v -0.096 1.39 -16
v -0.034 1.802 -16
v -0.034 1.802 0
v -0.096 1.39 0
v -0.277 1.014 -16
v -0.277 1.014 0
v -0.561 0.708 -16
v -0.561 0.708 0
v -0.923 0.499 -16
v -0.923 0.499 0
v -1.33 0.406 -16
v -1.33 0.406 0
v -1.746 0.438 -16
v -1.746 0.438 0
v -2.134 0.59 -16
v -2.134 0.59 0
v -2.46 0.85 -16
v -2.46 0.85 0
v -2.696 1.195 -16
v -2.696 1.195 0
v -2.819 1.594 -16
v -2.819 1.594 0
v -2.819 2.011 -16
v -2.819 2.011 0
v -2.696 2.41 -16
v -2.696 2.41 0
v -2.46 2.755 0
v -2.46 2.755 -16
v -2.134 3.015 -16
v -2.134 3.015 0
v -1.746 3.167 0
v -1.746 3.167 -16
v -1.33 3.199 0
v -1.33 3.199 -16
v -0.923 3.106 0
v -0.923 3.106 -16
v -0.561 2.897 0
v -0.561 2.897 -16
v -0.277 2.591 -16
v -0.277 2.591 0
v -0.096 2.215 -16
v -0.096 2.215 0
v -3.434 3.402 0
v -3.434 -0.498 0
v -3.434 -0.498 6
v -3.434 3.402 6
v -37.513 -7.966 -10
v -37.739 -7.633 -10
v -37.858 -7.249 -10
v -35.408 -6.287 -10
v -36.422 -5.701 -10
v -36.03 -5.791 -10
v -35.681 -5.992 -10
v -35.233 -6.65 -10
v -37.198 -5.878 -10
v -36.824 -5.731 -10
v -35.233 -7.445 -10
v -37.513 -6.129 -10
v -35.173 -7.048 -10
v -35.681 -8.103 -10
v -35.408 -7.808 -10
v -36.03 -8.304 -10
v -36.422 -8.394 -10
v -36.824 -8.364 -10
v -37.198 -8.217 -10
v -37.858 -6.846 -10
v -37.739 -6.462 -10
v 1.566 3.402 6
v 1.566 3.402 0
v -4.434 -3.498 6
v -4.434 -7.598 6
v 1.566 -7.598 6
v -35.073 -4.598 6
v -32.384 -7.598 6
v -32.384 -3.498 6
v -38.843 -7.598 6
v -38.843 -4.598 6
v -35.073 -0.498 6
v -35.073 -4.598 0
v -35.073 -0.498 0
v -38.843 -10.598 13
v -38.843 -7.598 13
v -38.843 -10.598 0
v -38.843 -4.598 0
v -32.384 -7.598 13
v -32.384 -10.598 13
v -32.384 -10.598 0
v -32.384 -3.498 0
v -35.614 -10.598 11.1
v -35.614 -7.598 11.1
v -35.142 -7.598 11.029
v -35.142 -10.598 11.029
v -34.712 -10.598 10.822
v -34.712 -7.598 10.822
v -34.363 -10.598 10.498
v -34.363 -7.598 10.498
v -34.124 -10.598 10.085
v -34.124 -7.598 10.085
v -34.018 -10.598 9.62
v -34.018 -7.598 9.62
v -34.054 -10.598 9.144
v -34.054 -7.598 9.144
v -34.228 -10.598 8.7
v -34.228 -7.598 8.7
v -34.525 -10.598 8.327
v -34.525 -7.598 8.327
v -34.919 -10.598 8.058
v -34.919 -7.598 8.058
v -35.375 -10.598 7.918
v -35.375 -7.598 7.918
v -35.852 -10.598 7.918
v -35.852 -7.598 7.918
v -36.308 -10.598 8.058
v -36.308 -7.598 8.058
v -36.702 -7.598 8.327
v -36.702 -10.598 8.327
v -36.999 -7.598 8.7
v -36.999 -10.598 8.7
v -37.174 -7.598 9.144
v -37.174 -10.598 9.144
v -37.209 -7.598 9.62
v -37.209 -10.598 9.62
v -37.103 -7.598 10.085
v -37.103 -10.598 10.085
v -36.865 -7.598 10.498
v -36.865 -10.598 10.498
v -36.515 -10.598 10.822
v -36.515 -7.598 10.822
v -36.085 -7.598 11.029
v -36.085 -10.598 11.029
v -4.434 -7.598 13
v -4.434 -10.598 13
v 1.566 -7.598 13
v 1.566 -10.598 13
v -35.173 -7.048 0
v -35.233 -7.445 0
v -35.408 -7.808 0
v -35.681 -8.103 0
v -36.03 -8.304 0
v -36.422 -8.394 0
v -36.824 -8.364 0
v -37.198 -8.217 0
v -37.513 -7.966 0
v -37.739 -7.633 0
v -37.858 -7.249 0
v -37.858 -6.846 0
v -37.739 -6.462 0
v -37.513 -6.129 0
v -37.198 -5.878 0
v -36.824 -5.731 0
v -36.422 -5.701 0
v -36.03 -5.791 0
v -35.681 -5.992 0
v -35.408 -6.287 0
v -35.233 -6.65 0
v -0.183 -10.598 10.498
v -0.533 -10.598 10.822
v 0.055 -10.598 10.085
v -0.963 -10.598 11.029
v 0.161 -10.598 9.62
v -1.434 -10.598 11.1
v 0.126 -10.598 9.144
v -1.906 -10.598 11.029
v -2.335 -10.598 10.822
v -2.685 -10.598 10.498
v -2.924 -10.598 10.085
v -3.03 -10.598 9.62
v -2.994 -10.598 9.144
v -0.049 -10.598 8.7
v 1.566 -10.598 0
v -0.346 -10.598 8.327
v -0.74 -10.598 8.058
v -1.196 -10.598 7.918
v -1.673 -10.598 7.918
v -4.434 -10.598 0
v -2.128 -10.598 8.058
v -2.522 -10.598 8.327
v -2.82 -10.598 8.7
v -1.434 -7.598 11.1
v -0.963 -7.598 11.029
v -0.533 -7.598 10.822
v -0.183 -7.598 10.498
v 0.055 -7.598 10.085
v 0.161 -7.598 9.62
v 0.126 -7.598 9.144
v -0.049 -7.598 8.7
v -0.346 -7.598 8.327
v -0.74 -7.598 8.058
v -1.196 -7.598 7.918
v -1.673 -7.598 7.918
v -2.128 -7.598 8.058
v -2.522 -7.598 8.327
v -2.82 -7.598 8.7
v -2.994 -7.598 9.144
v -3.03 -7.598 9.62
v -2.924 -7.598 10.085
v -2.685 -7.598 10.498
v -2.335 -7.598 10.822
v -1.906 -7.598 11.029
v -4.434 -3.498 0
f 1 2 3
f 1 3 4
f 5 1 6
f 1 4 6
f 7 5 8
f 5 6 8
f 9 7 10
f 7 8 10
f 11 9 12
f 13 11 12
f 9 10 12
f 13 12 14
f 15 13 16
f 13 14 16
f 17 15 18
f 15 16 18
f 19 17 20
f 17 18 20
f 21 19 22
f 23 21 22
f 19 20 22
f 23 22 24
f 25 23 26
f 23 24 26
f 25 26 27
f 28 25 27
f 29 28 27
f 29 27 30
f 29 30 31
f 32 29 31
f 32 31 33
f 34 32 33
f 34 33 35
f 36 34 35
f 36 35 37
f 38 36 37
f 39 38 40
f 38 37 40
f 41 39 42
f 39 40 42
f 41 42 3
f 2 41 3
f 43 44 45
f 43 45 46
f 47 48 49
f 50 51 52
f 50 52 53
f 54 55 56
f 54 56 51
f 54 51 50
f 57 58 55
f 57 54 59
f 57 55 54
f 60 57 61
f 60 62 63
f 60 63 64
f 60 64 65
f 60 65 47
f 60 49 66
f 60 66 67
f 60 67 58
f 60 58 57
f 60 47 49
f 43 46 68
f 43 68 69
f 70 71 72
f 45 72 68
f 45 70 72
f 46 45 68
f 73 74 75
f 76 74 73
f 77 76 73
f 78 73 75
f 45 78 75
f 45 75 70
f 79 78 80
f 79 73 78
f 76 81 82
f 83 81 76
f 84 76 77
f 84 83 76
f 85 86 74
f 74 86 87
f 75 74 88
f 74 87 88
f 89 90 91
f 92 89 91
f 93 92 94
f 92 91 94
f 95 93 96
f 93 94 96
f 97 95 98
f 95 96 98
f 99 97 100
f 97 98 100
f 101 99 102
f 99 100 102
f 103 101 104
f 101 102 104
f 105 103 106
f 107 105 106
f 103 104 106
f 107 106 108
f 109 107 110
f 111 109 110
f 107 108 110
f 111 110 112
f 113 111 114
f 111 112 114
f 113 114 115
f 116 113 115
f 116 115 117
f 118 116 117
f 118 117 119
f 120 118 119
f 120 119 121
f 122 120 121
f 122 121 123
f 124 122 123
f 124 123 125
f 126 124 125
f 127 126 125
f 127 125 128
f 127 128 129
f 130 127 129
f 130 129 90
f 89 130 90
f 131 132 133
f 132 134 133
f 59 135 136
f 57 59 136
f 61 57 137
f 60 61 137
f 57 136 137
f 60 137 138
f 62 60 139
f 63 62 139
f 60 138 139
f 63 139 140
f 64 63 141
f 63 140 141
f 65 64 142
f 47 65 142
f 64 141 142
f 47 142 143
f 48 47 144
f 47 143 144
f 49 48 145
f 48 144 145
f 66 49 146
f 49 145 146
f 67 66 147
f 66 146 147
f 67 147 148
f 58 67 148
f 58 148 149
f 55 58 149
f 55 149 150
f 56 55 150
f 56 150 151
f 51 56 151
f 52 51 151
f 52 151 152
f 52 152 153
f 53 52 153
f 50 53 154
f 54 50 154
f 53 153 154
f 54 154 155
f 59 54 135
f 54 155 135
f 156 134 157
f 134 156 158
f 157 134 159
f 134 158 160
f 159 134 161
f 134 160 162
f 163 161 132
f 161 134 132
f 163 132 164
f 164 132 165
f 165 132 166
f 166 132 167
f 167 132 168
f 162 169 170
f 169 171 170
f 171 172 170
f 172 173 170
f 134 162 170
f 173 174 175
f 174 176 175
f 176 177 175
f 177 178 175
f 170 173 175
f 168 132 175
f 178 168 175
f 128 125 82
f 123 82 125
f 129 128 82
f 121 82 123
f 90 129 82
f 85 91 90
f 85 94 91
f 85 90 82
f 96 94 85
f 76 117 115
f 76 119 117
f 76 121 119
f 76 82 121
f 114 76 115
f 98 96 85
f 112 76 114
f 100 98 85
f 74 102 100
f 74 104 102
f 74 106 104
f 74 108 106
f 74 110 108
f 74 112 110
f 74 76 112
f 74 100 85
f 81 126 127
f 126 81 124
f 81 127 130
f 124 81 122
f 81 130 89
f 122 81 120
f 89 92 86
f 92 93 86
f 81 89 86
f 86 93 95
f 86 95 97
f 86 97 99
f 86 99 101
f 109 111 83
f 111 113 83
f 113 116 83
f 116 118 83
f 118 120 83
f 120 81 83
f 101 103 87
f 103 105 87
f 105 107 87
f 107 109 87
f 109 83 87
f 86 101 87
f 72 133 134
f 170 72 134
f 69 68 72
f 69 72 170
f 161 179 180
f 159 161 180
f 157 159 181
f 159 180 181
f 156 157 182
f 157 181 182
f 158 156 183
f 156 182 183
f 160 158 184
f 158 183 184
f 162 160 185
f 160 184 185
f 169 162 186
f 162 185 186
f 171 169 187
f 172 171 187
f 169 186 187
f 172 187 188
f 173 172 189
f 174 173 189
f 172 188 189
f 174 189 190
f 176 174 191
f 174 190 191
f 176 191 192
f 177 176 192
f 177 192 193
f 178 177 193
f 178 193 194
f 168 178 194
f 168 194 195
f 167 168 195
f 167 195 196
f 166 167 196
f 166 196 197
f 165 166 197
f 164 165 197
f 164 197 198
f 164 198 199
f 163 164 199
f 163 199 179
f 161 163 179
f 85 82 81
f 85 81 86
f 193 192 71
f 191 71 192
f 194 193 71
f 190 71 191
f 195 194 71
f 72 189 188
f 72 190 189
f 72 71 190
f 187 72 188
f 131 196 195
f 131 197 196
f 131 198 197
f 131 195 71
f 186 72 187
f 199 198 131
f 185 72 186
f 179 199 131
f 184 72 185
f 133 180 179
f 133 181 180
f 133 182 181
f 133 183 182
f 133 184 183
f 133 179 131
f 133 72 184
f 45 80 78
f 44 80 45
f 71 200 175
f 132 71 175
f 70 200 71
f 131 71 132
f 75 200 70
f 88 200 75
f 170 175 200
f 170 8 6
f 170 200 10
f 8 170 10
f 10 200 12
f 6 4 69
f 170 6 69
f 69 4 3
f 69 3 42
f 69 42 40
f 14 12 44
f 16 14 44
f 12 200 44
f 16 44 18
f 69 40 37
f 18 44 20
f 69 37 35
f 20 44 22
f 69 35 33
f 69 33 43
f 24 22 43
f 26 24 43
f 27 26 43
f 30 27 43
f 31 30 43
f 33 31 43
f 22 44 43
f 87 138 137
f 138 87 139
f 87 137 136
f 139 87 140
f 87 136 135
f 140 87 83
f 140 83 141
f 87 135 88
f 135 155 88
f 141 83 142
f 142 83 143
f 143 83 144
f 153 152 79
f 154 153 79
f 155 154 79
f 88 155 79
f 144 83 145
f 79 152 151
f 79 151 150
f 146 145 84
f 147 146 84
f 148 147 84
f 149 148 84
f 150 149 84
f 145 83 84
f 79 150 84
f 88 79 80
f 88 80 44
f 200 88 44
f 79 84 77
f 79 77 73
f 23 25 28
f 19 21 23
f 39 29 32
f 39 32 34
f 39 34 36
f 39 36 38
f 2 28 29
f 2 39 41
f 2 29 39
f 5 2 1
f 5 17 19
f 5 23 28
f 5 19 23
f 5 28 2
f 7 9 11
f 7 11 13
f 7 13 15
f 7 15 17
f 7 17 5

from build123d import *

# Parameters (mm, degrees)
SKETCH1_W            = 4
SKETCH1_H            = 14
BOSS_EXTRUDE1_DEPTH  = 3
SKETCH2_R            = 1.4
BOSS_EXTRUDE2_DEPTH  = 16
SKETCH3_W            = 4
SKETCH3_H            = 1
BOSS_EXTRUDE4_DEPTH  = 6
SKETCH7_W            = 3
SKETCH7_H            = 2
BOSS_EXTRUDE5_DEPTH  = 30.95
SKETCH8_W            = 3
SKETCH8_H            = 2
BOSS_EXTRUDE6_DEPTH  = 1
SKETCH9_W            = 1
SKETCH9_H            = 2
BOSS_EXTRUDE7_DEPTH  = 3
SKETCH10_W           = 1
SKETCH10_H           = 2
BOSS_EXTRUDE8_DEPTH  = 5.92
SKETCH11_W           = 1
SKETCH11_H           = 2
BOSS_EXTRUDE9_DEPTH  = 4
SKETCH12_W           = 1
SKETCH12_H           = 3
BOSS_EXTRUDE14_DEPTH = 0.93
SKETCH13_W           = 3
SKETCH13_H           = 3
BOSS_EXTRUDE15_DEPTH = 7.1
SKETCH14_W           = 3.33402541
SKETCH14_H           = 13.860919233
CUT_EXTRUDE3_DEPTH   = 10
SKETCH15_W           = 6.20666024
SKETCH15_H           = 3.660501205
CUT_EXTRUDE4_DEPTH   = 10
SKETCH16_W           = 3
SKETCH16_H           = 9.1
BOSS_EXTRUDE16_DEPTH = 0.12
SKETCH18_W           = 3
SKETCH18_H           = 9.1
BOSS_EXTRUDE18_DEPTH = 0.41
SKETCH19_W           = 3
SKETCH19_H           = 9.1
BOSS_EXTRUDE19_DEPTH = 0.89
SKETCH20_W           = 3
SKETCH20_H           = 6
BOSS_EXTRUDE20_DEPTH = 3.77
SKETCH21_R           = 1.35
BOSS_EXTRUDE23_DEPTH = 10
BOSS_EXTRUDE24_DEPTH = 3
SKETCH24_W           = 4
SKETCH24_H           = 1
BOSS_EXTRUDE25_DEPTH = 4
SKETCH25_W           = 4
SKETCH25_H           = 7
BOSS_EXTRUDE26_DEPTH = 2
SKETCH26_W           = 6.458993184
SKETCH26_H           = 3
BOSS_EXTRUDE27_DEPTH = 7
SKETCH27_R           = 1.6
CUT_EXTRUDE5_DEPTH   = 7
SKETCH28_R           = 1.6
CUT_EXTRUDE6_DEPTH   = 7
SKETCH30_W           = 7
SKETCH30_H           = 3
BOSS_EXTRUDE29_DEPTH = 1
SKETCH31_W           = 7
SKETCH31_H           = 3
BOSS_EXTRUDE30_DEPTH = 1
SKETCH32_W           = 6
SKETCH32_H           = 7.1
BOSS_EXTRUDE31_DEPTH = 1
SKETCH33_W           = 31.638993184
SKETCH33_H           = 6
BOSS_EXTRUDE32_DEPTH = 1
SKETCH34_W           = 6
SKETCH34_H           = 14
BOSS_EXTRUDE33_DEPTH = 1


with BuildPart() as part:
    # Sketch1 → Boss-Extrude1 (new body)
    with BuildSketch(Plane.XY):
        with Locations((-1.434146341, -3.597560976)):
            Rectangle(SKETCH1_W, SKETCH1_H)
    extrude(amount=BOSS_EXTRUDE1_DEPTH)

    # Sketch2 → Boss-Extrude2 (add)
    with BuildSketch(Plane(origin=(0, 0, 0), x_dir=(-1, 0, 0), z_dir=(0, 0, -1))):
        with Locations((1.434146341, 1.802439024)):
            Circle(SKETCH2_R)
    extrude(amount=BOSS_EXTRUDE2_DEPTH)

    # Sketch3 → Boss-Extrude4 (add)
    with BuildSketch(Plane.XY.offset(3)):
        with Locations((-1.434146341, -10.097560976)):
            Rectangle(SKETCH3_W, SKETCH3_H)
    extrude(amount=BOSS_EXTRUDE4_DEPTH)

    # Sketch7 → Boss-Extrude5 (add)
    with BuildSketch(Plane.ZY.offset(3.434146341)):
        with Locations((1.5, -2.497560976)):
            Rectangle(SKETCH7_W, SKETCH7_H)
    extrude(amount=BOSS_EXTRUDE5_DEPTH)

    # Sketch8 → Boss-Extrude6 (add)
    with BuildSketch(Plane.ZY.offset(34.384146341)):
        with Locations((1.5, -2.497560976)):
            Rectangle(SKETCH8_W, SKETCH8_H)
    extrude(amount=BOSS_EXTRUDE6_DEPTH)

    # Sketch9 → Boss-Extrude7 (add)
    with BuildSketch(Plane(origin=(0, 0, 0), x_dir=(-1, 0, 0), z_dir=(0, 0, -1))):
        with Locations((34.884146341, -2.497560976)):
            Rectangle(SKETCH9_W, SKETCH9_H)
    extrude(amount=BOSS_EXTRUDE7_DEPTH)

    # Sketch10 → Boss-Extrude8 (add)
    with BuildSketch(Plane(origin=(0, 0, -3), x_dir=(-1, 0, 0), z_dir=(0, 0, -1))):
        with Locations((34.884146341, -2.497560976)):
            Rectangle(SKETCH10_W, SKETCH10_H)
    extrude(amount=BOSS_EXTRUDE8_DEPTH)

    # Sketch11 → Boss-Extrude9 (add)
    with BuildSketch(Plane(origin=(0, 0, -8.92), x_dir=(-1, 0, 0), z_dir=(0, 0, -1))):
        with Locations((34.884146341, -2.497560976)):
            Rectangle(SKETCH11_W, SKETCH11_H)
    extrude(amount=BOSS_EXTRUDE9_DEPTH)

    # Sketch12 → Boss-Extrude14 (add)
    with BuildSketch(Plane.XZ.offset(3.497560976)):
        with Locations((-34.884146341, -9.28)):
            Rectangle(SKETCH12_W, SKETCH12_H)
    extrude(amount=BOSS_EXTRUDE14_DEPTH)

    # Sketch13 → Boss-Extrude15 (add)
    with BuildSketch(Plane.XZ.offset(3.497560976)):
        with Locations((-33.884146341, 1.5)):
            Rectangle(SKETCH13_W, SKETCH13_H)
    extrude(amount=BOSS_EXTRUDE15_DEPTH)

    # Sketch14 → Cut-Extrude3 (cut)
    with BuildSketch(Plane.XY.offset(3)):
        with Locations((-35.32015223, -3.66710136)):
            Rectangle(SKETCH14_W, SKETCH14_H)
    extrude(amount=-CUT_EXTRUDE3_DEPTH, mode=Mode.SUBTRACT)


with BuildPart() as cut_extrude3_piece_1:
    # of the separate pieces the step leaves, piece 1, a body of its own (cut_extrude3_pieces)
    add(part.part.solids().sort_by_distance((-3.434146341, 3.402439024, 0))[0])

    # Sketch16 → Boss-Extrude16 (add)
    with BuildSketch(Plane.ZY.offset(33.653139525)):
        with Locations((1.5, -6.047560976)):
            Rectangle(SKETCH16_W, SKETCH16_H)
    extrude(amount=BOSS_EXTRUDE16_DEPTH)

    # Sketch18 → Boss-Extrude18 (add)
    with BuildSketch(Plane.ZY.offset(33.773139525)):
        with Locations((1.5, -6.047560976)):
            Rectangle(SKETCH18_W, SKETCH18_H)
    extrude(amount=BOSS_EXTRUDE18_DEPTH)

    # Sketch19 → Boss-Extrude19 (add)
    with BuildSketch(Plane.ZY.offset(34.183139525)):
        with Locations((1.5, -6.047560976)):
            Rectangle(SKETCH19_W, SKETCH19_H)
    extrude(amount=BOSS_EXTRUDE19_DEPTH)

    # Sketch20 → Boss-Extrude20 (add)
    with BuildSketch(Plane.ZY.offset(35.073139525)):
        with Locations((1.5, -7.597560976)):
            Rectangle(SKETCH20_W, SKETCH20_H)
    extrude(amount=BOSS_EXTRUDE20_DEPTH)

    # Sketch21 → Boss-Extrude23 (add)
    with BuildSketch(Plane(origin=(0, 0, 0), x_dir=(-1, 0, 0), z_dir=(0, 0, -1))):
        with Locations((36.523139525, -7.047560976)):
            Circle(SKETCH21_R)
    extrude(amount=BOSS_EXTRUDE23_DEPTH)

    # Sketch23 → Boss-Extrude24 (add)
    with BuildSketch(Plane.XY.offset(3)):
        Polygon((-38.843139525, -10.597560976), (-38.843139525, -4.597560976), (-35.073139525, -4.597560976), (-35.073139525, -1.497560976), (-3.434146341, -1.497560976), (-3.434146341, 3.402439024), (0.565853659, 3.402439024), (0.565853659, -9.597560976), (-3.434146341, -9.597560976), (-3.434146341, -3.497560976), (-32.384146341, -3.497560976), (-32.384146341, -10.597560976), align=None)
    extrude(amount=BOSS_EXTRUDE24_DEPTH)

    # Sketch24 → Boss-Extrude25 (add)
    with BuildSketch(Plane.XY.offset(9)):
        with Locations((-1.434146341, -10.097560976)):
            Rectangle(SKETCH24_W, SKETCH24_H)
    extrude(amount=BOSS_EXTRUDE25_DEPTH)

    # Sketch25 → Boss-Extrude26 (add)
    with BuildSketch(Plane(origin=(0, -9.597560976, 0), x_dir=(1, 0, 0), z_dir=(0, 1, 0))):
        with Locations((-1.434146341, -9.5)):
            Rectangle(SKETCH25_W, SKETCH25_H)
    extrude(amount=BOSS_EXTRUDE26_DEPTH)

    # Sketch26 → Boss-Extrude27 (add)
    with BuildSketch(Plane.XY.offset(6)):
        with Locations((-35.613642933, -9.097560976)):
            Rectangle(SKETCH26_W, SKETCH26_H)
    extrude(amount=BOSS_EXTRUDE27_DEPTH)

    # Sketch27 → Cut-Extrude5 (cut)
    with BuildSketch(Plane(origin=(0, -7.597560976, 0), x_dir=(1, 0, 0), z_dir=(0, 1, 0))):
        with Locations((-35.613642933, -9.5)):
            Circle(SKETCH27_R)
    extrude(amount=-CUT_EXTRUDE5_DEPTH, mode=Mode.SUBTRACT)

    # Sketch28 → Cut-Extrude6 (cut)
    with BuildSketch(Plane(origin=(0, -7.597560976, 0), x_dir=(1, 0, 0), z_dir=(0, 1, 0))):
        with Locations((-1.434146341, -9.5)):
            Circle(SKETCH28_R)
    extrude(amount=-CUT_EXTRUDE6_DEPTH, mode=Mode.SUBTRACT)

    # Sketch30 → Boss-Extrude29 (add)
    with BuildSketch(Plane(origin=(0.565853659, 0, 0), x_dir=(0, 0, -1), z_dir=(1, 0, 0))):
        with Locations((-9.5, -9.097560976)):
            Rectangle(SKETCH30_W, SKETCH30_H)
    extrude(amount=BOSS_EXTRUDE29_DEPTH)

    # Sketch31 → Boss-Extrude30 (add)
    with BuildSketch(Plane.ZY.offset(3.434146341)):
        with Locations((9.5, -9.097560976)):
            Rectangle(SKETCH31_W, SKETCH31_H)
    extrude(amount=BOSS_EXTRUDE30_DEPTH)

    # Sketch32 → Boss-Extrude31 (add)
    with BuildSketch(Plane.ZY.offset(3.434146341)):
        with Locations((3, -7.047560976)):
            Rectangle(SKETCH32_W, SKETCH32_H)
    extrude(amount=BOSS_EXTRUDE31_DEPTH)

    # Sketch33 → Boss-Extrude32 (add)
    with BuildSketch(Plane(origin=(0, -1.497560976, 0), x_dir=(1, 0, 0), z_dir=(0, 1, 0))):
        with Locations((-19.253642933, -3)):
            Rectangle(SKETCH33_W, SKETCH33_H)
    extrude(amount=BOSS_EXTRUDE32_DEPTH)

    # Sketch34 → Boss-Extrude33 (add)
    with BuildSketch(Plane(origin=(0.565853659, 0, 0), x_dir=(0, 0, -1), z_dir=(1, 0, 0))):
        with Locations((-3, -3.597560976)):
            Rectangle(SKETCH34_W, SKETCH34_H)
    extrude(amount=BOSS_EXTRUDE33_DEPTH)


with BuildPart() as cut_extrude3_piece_2:
    # of the separate pieces the step leaves, piece 2, a body of its own (cut_extrude3_pieces)
    add(part.part.solids().sort_by_distance((-34.384146341, -1.497560976, -7))[0])

    # Sketch15 → Cut-Extrude4 (cut)
    with BuildSketch(Plane.ZY.offset(35.384146341)):
        with Locations((-9.81666988, -3.327811578)):
            Rectangle(SKETCH15_W, SKETCH15_H)
    extrude(amount=-CUT_EXTRUDE4_DEPTH, mode=Mode.SUBTRACT)


solid = cut_extrude3_piece_1.part
